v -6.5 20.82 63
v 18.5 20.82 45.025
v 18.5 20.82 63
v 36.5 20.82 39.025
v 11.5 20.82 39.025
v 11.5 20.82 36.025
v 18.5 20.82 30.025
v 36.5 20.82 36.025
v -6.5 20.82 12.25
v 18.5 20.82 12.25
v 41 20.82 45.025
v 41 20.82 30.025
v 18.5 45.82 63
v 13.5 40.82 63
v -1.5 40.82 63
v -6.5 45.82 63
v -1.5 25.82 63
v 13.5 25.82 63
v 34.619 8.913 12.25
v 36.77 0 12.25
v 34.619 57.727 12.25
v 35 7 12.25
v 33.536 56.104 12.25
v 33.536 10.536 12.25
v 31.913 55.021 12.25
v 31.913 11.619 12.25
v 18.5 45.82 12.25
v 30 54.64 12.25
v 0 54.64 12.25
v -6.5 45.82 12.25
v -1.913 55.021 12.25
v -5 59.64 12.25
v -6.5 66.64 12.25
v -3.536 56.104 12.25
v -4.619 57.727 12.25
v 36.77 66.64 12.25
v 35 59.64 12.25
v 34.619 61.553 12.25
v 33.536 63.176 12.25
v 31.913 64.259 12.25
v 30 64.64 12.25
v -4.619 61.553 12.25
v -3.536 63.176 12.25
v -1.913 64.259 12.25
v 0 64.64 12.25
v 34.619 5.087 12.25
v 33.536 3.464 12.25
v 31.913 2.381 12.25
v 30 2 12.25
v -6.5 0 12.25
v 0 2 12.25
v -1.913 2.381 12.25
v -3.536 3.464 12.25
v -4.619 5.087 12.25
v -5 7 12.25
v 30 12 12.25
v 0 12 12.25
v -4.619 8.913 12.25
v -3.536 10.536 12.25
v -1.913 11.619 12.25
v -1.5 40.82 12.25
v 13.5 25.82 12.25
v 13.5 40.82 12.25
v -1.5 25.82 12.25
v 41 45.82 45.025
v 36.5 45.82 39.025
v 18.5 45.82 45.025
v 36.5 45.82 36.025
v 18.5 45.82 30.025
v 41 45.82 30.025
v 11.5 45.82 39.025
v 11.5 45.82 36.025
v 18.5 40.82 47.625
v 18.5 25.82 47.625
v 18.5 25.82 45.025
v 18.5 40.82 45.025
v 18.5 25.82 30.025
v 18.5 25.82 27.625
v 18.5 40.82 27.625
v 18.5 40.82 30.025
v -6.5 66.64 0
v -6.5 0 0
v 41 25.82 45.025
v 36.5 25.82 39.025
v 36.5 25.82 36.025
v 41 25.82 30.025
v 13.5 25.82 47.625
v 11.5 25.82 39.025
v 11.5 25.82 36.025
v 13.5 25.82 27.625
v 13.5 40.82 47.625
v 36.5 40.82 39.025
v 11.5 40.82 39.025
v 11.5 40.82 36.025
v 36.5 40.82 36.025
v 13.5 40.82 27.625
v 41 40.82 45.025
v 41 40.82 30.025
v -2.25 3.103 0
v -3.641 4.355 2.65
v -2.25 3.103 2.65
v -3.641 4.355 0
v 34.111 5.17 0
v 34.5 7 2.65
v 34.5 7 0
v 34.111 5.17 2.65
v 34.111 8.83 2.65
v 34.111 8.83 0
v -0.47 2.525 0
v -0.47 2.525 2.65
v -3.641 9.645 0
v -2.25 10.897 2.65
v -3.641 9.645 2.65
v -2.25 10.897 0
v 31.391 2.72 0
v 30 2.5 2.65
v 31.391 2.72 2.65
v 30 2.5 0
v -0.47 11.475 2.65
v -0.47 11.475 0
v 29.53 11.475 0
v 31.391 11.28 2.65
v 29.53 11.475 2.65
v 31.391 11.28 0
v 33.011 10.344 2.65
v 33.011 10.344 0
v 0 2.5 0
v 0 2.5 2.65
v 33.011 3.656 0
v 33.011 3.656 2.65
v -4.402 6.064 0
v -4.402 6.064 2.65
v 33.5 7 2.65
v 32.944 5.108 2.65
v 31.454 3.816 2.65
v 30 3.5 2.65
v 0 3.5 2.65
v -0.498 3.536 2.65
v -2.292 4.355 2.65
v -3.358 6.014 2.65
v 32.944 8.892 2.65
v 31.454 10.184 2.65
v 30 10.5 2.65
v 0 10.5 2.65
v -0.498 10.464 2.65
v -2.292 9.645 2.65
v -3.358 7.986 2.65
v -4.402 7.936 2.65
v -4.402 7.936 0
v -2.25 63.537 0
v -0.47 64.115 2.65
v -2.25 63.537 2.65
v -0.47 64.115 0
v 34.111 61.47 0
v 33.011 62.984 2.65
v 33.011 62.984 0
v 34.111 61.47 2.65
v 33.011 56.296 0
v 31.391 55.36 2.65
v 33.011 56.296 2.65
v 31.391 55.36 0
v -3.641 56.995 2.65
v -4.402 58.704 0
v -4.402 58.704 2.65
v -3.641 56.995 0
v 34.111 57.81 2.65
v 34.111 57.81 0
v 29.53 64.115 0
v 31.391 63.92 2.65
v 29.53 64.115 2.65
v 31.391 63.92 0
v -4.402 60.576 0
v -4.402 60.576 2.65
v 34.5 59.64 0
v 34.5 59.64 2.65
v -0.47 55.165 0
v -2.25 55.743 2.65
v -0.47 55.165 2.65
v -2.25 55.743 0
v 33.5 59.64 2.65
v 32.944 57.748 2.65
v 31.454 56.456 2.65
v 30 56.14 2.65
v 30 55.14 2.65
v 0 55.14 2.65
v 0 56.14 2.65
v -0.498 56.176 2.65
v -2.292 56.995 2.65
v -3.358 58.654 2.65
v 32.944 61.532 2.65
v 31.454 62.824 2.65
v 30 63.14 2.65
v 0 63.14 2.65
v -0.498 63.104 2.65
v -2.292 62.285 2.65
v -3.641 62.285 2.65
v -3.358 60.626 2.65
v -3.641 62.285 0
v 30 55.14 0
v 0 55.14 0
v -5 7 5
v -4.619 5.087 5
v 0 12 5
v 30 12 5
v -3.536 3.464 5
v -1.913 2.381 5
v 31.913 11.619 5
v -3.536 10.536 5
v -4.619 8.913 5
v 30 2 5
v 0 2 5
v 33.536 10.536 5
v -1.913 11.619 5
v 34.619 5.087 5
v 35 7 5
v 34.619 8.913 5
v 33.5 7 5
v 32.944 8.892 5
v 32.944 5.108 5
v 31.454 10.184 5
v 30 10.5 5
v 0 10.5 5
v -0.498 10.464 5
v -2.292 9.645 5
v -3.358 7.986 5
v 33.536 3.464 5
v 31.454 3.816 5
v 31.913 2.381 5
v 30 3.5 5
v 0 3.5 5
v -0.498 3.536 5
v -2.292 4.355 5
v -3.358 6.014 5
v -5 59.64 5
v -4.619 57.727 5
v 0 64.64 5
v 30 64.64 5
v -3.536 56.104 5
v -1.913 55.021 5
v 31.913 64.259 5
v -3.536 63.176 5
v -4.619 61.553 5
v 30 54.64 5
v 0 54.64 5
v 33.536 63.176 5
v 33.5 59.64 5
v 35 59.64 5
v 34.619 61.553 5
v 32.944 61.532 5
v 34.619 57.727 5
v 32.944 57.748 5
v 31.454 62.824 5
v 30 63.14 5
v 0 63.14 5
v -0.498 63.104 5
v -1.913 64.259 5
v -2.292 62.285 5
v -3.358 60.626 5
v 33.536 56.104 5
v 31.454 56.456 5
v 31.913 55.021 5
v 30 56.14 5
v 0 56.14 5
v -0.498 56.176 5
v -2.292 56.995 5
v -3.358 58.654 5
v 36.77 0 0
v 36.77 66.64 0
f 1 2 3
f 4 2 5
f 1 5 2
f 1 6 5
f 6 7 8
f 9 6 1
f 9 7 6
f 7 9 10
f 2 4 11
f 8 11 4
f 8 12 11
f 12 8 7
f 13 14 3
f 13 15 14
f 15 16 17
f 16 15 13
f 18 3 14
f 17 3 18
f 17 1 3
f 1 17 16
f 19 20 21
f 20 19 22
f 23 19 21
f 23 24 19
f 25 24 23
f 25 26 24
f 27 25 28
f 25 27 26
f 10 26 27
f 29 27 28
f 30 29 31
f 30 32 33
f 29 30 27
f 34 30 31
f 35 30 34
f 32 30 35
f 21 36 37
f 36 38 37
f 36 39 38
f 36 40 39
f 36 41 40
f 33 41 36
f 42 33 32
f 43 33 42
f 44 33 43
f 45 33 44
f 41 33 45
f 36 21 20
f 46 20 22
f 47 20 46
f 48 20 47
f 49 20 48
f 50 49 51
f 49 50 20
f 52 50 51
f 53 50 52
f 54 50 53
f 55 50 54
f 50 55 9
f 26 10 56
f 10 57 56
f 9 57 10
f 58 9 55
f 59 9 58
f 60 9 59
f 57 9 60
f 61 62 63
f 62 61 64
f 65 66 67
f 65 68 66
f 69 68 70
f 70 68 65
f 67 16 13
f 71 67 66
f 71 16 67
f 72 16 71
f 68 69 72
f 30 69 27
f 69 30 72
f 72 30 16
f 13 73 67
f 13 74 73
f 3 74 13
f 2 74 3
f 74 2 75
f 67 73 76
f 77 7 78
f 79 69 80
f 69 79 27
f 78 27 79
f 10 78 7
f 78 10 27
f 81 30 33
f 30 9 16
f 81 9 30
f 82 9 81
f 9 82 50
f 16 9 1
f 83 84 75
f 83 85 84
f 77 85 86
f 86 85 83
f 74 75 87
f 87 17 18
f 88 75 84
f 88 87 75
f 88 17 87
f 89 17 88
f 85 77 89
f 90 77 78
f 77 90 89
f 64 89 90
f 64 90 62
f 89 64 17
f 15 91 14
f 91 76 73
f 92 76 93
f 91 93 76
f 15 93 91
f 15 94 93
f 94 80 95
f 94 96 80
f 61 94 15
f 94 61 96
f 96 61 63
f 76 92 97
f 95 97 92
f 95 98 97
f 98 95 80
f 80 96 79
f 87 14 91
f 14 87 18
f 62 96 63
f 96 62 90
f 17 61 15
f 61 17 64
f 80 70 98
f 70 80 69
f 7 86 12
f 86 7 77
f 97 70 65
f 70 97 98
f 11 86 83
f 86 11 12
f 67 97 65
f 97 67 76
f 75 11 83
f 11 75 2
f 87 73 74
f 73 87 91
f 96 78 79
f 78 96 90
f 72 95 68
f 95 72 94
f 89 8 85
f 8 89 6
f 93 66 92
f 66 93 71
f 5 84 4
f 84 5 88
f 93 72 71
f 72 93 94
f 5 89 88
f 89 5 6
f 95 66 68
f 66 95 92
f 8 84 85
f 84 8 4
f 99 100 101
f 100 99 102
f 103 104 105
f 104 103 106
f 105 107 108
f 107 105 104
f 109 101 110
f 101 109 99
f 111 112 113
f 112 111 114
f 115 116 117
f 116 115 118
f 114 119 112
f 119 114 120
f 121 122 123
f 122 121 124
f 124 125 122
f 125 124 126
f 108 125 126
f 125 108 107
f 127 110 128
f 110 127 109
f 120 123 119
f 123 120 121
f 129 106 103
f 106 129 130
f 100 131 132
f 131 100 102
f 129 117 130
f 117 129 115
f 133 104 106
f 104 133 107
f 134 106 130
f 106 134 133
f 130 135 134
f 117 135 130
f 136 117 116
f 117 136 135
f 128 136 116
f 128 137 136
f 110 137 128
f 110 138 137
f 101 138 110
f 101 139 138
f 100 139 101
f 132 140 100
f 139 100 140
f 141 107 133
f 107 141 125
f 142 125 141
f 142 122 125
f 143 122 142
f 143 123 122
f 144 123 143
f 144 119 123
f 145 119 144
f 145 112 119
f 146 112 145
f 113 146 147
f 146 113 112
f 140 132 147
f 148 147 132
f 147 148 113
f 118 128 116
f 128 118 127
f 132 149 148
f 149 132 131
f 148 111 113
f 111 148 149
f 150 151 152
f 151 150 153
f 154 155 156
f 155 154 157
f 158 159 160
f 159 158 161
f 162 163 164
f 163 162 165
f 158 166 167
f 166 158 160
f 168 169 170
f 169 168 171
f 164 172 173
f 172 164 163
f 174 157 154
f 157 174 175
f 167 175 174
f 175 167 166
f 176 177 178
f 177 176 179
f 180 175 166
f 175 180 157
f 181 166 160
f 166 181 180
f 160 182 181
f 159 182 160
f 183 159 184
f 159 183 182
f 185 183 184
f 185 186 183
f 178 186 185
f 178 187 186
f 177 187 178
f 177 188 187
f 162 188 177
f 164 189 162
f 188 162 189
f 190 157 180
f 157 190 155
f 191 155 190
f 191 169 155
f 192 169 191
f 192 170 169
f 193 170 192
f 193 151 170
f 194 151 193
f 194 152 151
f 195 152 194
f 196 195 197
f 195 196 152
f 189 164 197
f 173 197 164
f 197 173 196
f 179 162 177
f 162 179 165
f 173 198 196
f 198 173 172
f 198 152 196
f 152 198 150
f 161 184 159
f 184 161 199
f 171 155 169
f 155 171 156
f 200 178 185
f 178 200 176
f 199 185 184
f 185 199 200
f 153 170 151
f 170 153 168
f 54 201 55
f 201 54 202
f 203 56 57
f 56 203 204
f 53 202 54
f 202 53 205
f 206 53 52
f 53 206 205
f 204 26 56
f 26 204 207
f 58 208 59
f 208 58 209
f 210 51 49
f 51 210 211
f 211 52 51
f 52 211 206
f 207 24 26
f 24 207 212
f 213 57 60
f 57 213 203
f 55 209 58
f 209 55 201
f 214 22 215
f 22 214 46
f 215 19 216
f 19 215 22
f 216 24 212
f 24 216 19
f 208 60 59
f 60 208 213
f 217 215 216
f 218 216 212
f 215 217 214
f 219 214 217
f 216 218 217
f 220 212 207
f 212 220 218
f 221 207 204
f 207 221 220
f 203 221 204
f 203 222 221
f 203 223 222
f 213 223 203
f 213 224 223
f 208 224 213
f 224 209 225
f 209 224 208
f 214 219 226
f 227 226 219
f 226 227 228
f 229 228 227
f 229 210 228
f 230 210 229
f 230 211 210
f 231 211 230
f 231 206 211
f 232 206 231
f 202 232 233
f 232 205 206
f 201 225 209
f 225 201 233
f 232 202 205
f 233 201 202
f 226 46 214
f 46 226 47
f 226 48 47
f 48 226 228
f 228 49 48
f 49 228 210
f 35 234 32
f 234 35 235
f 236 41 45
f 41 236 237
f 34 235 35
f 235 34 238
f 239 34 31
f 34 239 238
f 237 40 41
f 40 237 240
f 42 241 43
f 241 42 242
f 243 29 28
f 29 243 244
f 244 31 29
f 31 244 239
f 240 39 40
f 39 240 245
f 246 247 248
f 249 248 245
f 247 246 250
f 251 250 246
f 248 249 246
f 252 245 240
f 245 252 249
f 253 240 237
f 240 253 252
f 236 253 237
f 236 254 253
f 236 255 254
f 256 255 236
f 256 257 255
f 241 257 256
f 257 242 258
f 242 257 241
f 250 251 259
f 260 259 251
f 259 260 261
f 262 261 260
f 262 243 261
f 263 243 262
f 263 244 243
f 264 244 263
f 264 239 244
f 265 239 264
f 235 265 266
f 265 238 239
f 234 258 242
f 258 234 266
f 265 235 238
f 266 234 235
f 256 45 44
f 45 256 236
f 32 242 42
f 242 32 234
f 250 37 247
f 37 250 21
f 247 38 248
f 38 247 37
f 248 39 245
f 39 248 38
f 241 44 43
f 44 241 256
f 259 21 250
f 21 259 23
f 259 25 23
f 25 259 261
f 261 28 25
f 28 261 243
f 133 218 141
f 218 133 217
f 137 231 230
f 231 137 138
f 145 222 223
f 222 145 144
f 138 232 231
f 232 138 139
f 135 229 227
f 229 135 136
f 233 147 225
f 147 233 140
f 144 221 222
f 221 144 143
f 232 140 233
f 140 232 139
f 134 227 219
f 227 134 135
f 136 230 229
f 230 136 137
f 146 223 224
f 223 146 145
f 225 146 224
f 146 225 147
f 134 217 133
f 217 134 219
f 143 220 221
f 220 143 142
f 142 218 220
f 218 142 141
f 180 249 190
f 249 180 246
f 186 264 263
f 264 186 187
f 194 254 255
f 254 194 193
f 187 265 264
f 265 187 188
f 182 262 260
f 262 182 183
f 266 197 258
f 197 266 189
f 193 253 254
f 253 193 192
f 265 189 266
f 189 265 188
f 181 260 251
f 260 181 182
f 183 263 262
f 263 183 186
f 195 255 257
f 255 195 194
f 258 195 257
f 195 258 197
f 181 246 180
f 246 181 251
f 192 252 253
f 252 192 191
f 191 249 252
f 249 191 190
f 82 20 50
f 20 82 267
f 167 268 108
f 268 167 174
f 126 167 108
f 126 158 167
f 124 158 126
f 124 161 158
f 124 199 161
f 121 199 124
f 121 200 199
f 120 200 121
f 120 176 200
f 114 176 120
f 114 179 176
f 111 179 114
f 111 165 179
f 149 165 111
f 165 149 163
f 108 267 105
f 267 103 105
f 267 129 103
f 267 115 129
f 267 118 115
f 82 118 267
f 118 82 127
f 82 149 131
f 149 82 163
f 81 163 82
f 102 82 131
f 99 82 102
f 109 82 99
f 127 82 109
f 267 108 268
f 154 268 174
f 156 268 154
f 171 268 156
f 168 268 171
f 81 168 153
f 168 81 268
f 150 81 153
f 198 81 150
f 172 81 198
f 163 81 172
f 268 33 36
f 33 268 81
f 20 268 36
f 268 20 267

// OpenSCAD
module cutout1 () {

hull () {

translate ([0,2.5,-.1]) cube ([30,7, 2.75], center = false);
translate ([0,7,-.1]) cylinder (h = 2.75, r = 4.5, center = false);
translate ([30,7,-.1]) cylinder (h = 2.75, r = 4.5, center = false);

}

hull () {

translate ([0,55.14,-.1]) cube ([30,7, 2.75], center = false);
translate ([0,59.64,-.1]) cylinder (h = 2.75, r =4.5, center = false);
translate ([30,59.64,-.1]) cylinder (h = 2.75, r =4.5, center = false);

}

hull () {

translate ([0,2.5,5]) cube ([30,8, 7.26], center = false);
translate ([0,7,5]) cylinder (h = 7.26, r = 5, center = false);
translate ([30,7,5]) cylinder (h = 7.26, r = 5, center = false);

}

hull () {

translate ([0,55.14,5]) cube ([30, 8, 7.26], center = false);
translate ([0,59.64,5]) cylinder (h = 7.26, r = 5, center = false);
translate ([30,59.64,5]) cylinder (h = 7.26, r = 5, center = false);

}

}

module cutout2 () {

union () {

cutout1 ();


hull () {

translate ([0,3.5,0]) cube ([30,7, 12.25], center = false);
translate ([0,7,0]) cylinder (h = 12.25, r = 3.5, center = false);
translate ([30,7,0]) cylinder (h = 12.25, r = 3.5, center = false);

}

hull () {

translate ([0,56.14,0]) cube ([30,7, 12.25], center = false);
translate ([0,59.64,0]) cylinder (h = 12.25, r =3.5, center = false);
translate ([30,59.64,0]) cylinder (h = 12.25, r =3.5, center = false);

}

}

}

module base () {

difference () {

translate ([-6.5,66.64,0]) rotate ([0,0,-90]) cube ([66.64, 43.27, 12.25], center = false);

cutout2();

}

}

/////

module gear_holder () {

difference () {

translate ([0,22.5,-0.1]) { 

rotate([0, 270, 0]) {

cube ([15,25,25], center = true);

}

}

cube ([15, 15, 60.0], center = true);

}

}

module main_base () {

difference () {

cube ([25, 25, 50.75], center = true);

translate ([0,0,-0.1]) { 

cube ([15, 15, 60.0], center = true);

}

}

}

module quarter_final_base () {

union () {

main_base ();

gear_holder ();

}

}


module semi_final_base () {

difference () {

quarter_final_base ();

translate ([0,20,0]) {

cube ([15, 40, 20], center = true);

}

}



}

module final_base () {

difference () {

semi_final_base ();

translate ([0,18,-0.1]) { 

rotate([0, 90, 0]) {

cube ([3,25,50], center = true);

//cylinder (r = 1.5, h= 27, center = true);

}

}

}

}

module Project_3 () {

union () {

translate ([6,33.32,37.625]) {

rotate ([0,0,270]){

final_base ();

}

}

base ();

}

}

Project_3 ();
